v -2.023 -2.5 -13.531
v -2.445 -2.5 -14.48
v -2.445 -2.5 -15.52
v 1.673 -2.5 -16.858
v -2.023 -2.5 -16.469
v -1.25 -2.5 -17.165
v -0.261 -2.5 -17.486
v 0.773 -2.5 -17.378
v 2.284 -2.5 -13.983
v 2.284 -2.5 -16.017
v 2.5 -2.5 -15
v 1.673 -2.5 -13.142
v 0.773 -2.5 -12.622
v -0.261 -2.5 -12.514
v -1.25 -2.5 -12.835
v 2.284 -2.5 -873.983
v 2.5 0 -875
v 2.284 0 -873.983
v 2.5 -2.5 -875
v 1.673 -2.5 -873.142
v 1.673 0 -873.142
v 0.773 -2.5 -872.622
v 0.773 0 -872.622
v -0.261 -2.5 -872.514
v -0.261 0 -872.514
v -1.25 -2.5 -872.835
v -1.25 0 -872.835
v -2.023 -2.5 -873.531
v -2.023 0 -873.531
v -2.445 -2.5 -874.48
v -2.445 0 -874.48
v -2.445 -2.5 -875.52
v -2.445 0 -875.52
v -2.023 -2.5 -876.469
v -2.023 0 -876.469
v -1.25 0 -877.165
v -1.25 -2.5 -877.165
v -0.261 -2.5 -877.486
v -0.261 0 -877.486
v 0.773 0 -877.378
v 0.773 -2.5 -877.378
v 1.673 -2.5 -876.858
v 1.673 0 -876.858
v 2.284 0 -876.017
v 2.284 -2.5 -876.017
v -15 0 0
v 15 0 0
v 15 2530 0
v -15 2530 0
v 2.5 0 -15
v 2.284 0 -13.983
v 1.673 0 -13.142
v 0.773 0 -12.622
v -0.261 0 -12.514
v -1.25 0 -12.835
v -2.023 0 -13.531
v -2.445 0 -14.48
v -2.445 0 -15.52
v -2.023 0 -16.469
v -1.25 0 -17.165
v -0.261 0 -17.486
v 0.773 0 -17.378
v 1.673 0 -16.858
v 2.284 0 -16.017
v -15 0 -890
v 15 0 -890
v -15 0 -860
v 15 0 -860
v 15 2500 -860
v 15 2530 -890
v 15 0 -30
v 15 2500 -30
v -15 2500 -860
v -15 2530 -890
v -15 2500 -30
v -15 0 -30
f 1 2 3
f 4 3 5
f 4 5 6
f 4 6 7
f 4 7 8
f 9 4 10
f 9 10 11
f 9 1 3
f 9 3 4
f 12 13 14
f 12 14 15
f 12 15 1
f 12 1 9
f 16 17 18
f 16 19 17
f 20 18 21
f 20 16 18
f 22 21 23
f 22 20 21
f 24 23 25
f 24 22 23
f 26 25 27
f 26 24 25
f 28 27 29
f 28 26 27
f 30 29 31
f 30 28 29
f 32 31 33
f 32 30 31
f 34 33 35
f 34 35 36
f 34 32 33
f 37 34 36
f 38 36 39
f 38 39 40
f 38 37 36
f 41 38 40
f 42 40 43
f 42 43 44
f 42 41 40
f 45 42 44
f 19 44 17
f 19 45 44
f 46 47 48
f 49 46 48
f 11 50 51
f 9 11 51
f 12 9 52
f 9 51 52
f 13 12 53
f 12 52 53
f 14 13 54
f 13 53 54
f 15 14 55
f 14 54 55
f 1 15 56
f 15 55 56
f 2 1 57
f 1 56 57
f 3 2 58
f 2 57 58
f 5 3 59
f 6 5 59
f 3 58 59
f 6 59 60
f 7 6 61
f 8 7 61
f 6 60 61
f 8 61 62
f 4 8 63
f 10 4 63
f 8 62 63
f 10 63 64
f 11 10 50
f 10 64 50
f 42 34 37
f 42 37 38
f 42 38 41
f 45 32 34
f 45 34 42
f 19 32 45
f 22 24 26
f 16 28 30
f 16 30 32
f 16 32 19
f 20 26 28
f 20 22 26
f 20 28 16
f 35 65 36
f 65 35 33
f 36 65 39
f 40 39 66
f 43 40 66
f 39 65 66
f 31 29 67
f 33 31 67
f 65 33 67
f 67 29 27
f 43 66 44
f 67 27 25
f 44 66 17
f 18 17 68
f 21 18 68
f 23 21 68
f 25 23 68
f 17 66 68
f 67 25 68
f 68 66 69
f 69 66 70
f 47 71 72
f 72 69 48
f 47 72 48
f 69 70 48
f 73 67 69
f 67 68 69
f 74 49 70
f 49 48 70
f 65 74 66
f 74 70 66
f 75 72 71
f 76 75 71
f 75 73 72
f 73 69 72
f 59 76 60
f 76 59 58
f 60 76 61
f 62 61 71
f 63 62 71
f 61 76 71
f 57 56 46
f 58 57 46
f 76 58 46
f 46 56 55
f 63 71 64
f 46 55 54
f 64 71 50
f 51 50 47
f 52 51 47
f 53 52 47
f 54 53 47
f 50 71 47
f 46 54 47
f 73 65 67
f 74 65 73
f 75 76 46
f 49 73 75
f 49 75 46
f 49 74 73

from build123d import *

# Parameters (mm, degrees)
BOSS_EXTRUDE1_DEPTH = 15
SKETCH5_R           = 2.5
BOSS_EXTRUDE3_DEPTH = 2.5


with BuildPart() as part:
    # Sketch2 → Boss-Extrude1 (new body, symmetric)
    with BuildSketch(Plane(origin=(0, 0, 0), x_dir=(0, 0, -1), z_dir=(1, 0, 0))):
        Polygon((0, 0), (0, 2530), (890, 2530), (890, 0), (860, 0), (860, 2500), (30, 2500), (30, 0), align=None)
    extrude(amount=BOSS_EXTRUDE1_DEPTH, both=True)

    # Sketch5 → Boss-Extrude3 (add, symmetric)
    with BuildSketch(Plane.XZ):
        with Locations((0, -15)):
            Circle(SKETCH5_R)
        with Locations((0, -875)):
            Circle(SKETCH5_R)
    extrude(amount=BOSS_EXTRUDE3_DEPTH, both=True)


solid = part.part
